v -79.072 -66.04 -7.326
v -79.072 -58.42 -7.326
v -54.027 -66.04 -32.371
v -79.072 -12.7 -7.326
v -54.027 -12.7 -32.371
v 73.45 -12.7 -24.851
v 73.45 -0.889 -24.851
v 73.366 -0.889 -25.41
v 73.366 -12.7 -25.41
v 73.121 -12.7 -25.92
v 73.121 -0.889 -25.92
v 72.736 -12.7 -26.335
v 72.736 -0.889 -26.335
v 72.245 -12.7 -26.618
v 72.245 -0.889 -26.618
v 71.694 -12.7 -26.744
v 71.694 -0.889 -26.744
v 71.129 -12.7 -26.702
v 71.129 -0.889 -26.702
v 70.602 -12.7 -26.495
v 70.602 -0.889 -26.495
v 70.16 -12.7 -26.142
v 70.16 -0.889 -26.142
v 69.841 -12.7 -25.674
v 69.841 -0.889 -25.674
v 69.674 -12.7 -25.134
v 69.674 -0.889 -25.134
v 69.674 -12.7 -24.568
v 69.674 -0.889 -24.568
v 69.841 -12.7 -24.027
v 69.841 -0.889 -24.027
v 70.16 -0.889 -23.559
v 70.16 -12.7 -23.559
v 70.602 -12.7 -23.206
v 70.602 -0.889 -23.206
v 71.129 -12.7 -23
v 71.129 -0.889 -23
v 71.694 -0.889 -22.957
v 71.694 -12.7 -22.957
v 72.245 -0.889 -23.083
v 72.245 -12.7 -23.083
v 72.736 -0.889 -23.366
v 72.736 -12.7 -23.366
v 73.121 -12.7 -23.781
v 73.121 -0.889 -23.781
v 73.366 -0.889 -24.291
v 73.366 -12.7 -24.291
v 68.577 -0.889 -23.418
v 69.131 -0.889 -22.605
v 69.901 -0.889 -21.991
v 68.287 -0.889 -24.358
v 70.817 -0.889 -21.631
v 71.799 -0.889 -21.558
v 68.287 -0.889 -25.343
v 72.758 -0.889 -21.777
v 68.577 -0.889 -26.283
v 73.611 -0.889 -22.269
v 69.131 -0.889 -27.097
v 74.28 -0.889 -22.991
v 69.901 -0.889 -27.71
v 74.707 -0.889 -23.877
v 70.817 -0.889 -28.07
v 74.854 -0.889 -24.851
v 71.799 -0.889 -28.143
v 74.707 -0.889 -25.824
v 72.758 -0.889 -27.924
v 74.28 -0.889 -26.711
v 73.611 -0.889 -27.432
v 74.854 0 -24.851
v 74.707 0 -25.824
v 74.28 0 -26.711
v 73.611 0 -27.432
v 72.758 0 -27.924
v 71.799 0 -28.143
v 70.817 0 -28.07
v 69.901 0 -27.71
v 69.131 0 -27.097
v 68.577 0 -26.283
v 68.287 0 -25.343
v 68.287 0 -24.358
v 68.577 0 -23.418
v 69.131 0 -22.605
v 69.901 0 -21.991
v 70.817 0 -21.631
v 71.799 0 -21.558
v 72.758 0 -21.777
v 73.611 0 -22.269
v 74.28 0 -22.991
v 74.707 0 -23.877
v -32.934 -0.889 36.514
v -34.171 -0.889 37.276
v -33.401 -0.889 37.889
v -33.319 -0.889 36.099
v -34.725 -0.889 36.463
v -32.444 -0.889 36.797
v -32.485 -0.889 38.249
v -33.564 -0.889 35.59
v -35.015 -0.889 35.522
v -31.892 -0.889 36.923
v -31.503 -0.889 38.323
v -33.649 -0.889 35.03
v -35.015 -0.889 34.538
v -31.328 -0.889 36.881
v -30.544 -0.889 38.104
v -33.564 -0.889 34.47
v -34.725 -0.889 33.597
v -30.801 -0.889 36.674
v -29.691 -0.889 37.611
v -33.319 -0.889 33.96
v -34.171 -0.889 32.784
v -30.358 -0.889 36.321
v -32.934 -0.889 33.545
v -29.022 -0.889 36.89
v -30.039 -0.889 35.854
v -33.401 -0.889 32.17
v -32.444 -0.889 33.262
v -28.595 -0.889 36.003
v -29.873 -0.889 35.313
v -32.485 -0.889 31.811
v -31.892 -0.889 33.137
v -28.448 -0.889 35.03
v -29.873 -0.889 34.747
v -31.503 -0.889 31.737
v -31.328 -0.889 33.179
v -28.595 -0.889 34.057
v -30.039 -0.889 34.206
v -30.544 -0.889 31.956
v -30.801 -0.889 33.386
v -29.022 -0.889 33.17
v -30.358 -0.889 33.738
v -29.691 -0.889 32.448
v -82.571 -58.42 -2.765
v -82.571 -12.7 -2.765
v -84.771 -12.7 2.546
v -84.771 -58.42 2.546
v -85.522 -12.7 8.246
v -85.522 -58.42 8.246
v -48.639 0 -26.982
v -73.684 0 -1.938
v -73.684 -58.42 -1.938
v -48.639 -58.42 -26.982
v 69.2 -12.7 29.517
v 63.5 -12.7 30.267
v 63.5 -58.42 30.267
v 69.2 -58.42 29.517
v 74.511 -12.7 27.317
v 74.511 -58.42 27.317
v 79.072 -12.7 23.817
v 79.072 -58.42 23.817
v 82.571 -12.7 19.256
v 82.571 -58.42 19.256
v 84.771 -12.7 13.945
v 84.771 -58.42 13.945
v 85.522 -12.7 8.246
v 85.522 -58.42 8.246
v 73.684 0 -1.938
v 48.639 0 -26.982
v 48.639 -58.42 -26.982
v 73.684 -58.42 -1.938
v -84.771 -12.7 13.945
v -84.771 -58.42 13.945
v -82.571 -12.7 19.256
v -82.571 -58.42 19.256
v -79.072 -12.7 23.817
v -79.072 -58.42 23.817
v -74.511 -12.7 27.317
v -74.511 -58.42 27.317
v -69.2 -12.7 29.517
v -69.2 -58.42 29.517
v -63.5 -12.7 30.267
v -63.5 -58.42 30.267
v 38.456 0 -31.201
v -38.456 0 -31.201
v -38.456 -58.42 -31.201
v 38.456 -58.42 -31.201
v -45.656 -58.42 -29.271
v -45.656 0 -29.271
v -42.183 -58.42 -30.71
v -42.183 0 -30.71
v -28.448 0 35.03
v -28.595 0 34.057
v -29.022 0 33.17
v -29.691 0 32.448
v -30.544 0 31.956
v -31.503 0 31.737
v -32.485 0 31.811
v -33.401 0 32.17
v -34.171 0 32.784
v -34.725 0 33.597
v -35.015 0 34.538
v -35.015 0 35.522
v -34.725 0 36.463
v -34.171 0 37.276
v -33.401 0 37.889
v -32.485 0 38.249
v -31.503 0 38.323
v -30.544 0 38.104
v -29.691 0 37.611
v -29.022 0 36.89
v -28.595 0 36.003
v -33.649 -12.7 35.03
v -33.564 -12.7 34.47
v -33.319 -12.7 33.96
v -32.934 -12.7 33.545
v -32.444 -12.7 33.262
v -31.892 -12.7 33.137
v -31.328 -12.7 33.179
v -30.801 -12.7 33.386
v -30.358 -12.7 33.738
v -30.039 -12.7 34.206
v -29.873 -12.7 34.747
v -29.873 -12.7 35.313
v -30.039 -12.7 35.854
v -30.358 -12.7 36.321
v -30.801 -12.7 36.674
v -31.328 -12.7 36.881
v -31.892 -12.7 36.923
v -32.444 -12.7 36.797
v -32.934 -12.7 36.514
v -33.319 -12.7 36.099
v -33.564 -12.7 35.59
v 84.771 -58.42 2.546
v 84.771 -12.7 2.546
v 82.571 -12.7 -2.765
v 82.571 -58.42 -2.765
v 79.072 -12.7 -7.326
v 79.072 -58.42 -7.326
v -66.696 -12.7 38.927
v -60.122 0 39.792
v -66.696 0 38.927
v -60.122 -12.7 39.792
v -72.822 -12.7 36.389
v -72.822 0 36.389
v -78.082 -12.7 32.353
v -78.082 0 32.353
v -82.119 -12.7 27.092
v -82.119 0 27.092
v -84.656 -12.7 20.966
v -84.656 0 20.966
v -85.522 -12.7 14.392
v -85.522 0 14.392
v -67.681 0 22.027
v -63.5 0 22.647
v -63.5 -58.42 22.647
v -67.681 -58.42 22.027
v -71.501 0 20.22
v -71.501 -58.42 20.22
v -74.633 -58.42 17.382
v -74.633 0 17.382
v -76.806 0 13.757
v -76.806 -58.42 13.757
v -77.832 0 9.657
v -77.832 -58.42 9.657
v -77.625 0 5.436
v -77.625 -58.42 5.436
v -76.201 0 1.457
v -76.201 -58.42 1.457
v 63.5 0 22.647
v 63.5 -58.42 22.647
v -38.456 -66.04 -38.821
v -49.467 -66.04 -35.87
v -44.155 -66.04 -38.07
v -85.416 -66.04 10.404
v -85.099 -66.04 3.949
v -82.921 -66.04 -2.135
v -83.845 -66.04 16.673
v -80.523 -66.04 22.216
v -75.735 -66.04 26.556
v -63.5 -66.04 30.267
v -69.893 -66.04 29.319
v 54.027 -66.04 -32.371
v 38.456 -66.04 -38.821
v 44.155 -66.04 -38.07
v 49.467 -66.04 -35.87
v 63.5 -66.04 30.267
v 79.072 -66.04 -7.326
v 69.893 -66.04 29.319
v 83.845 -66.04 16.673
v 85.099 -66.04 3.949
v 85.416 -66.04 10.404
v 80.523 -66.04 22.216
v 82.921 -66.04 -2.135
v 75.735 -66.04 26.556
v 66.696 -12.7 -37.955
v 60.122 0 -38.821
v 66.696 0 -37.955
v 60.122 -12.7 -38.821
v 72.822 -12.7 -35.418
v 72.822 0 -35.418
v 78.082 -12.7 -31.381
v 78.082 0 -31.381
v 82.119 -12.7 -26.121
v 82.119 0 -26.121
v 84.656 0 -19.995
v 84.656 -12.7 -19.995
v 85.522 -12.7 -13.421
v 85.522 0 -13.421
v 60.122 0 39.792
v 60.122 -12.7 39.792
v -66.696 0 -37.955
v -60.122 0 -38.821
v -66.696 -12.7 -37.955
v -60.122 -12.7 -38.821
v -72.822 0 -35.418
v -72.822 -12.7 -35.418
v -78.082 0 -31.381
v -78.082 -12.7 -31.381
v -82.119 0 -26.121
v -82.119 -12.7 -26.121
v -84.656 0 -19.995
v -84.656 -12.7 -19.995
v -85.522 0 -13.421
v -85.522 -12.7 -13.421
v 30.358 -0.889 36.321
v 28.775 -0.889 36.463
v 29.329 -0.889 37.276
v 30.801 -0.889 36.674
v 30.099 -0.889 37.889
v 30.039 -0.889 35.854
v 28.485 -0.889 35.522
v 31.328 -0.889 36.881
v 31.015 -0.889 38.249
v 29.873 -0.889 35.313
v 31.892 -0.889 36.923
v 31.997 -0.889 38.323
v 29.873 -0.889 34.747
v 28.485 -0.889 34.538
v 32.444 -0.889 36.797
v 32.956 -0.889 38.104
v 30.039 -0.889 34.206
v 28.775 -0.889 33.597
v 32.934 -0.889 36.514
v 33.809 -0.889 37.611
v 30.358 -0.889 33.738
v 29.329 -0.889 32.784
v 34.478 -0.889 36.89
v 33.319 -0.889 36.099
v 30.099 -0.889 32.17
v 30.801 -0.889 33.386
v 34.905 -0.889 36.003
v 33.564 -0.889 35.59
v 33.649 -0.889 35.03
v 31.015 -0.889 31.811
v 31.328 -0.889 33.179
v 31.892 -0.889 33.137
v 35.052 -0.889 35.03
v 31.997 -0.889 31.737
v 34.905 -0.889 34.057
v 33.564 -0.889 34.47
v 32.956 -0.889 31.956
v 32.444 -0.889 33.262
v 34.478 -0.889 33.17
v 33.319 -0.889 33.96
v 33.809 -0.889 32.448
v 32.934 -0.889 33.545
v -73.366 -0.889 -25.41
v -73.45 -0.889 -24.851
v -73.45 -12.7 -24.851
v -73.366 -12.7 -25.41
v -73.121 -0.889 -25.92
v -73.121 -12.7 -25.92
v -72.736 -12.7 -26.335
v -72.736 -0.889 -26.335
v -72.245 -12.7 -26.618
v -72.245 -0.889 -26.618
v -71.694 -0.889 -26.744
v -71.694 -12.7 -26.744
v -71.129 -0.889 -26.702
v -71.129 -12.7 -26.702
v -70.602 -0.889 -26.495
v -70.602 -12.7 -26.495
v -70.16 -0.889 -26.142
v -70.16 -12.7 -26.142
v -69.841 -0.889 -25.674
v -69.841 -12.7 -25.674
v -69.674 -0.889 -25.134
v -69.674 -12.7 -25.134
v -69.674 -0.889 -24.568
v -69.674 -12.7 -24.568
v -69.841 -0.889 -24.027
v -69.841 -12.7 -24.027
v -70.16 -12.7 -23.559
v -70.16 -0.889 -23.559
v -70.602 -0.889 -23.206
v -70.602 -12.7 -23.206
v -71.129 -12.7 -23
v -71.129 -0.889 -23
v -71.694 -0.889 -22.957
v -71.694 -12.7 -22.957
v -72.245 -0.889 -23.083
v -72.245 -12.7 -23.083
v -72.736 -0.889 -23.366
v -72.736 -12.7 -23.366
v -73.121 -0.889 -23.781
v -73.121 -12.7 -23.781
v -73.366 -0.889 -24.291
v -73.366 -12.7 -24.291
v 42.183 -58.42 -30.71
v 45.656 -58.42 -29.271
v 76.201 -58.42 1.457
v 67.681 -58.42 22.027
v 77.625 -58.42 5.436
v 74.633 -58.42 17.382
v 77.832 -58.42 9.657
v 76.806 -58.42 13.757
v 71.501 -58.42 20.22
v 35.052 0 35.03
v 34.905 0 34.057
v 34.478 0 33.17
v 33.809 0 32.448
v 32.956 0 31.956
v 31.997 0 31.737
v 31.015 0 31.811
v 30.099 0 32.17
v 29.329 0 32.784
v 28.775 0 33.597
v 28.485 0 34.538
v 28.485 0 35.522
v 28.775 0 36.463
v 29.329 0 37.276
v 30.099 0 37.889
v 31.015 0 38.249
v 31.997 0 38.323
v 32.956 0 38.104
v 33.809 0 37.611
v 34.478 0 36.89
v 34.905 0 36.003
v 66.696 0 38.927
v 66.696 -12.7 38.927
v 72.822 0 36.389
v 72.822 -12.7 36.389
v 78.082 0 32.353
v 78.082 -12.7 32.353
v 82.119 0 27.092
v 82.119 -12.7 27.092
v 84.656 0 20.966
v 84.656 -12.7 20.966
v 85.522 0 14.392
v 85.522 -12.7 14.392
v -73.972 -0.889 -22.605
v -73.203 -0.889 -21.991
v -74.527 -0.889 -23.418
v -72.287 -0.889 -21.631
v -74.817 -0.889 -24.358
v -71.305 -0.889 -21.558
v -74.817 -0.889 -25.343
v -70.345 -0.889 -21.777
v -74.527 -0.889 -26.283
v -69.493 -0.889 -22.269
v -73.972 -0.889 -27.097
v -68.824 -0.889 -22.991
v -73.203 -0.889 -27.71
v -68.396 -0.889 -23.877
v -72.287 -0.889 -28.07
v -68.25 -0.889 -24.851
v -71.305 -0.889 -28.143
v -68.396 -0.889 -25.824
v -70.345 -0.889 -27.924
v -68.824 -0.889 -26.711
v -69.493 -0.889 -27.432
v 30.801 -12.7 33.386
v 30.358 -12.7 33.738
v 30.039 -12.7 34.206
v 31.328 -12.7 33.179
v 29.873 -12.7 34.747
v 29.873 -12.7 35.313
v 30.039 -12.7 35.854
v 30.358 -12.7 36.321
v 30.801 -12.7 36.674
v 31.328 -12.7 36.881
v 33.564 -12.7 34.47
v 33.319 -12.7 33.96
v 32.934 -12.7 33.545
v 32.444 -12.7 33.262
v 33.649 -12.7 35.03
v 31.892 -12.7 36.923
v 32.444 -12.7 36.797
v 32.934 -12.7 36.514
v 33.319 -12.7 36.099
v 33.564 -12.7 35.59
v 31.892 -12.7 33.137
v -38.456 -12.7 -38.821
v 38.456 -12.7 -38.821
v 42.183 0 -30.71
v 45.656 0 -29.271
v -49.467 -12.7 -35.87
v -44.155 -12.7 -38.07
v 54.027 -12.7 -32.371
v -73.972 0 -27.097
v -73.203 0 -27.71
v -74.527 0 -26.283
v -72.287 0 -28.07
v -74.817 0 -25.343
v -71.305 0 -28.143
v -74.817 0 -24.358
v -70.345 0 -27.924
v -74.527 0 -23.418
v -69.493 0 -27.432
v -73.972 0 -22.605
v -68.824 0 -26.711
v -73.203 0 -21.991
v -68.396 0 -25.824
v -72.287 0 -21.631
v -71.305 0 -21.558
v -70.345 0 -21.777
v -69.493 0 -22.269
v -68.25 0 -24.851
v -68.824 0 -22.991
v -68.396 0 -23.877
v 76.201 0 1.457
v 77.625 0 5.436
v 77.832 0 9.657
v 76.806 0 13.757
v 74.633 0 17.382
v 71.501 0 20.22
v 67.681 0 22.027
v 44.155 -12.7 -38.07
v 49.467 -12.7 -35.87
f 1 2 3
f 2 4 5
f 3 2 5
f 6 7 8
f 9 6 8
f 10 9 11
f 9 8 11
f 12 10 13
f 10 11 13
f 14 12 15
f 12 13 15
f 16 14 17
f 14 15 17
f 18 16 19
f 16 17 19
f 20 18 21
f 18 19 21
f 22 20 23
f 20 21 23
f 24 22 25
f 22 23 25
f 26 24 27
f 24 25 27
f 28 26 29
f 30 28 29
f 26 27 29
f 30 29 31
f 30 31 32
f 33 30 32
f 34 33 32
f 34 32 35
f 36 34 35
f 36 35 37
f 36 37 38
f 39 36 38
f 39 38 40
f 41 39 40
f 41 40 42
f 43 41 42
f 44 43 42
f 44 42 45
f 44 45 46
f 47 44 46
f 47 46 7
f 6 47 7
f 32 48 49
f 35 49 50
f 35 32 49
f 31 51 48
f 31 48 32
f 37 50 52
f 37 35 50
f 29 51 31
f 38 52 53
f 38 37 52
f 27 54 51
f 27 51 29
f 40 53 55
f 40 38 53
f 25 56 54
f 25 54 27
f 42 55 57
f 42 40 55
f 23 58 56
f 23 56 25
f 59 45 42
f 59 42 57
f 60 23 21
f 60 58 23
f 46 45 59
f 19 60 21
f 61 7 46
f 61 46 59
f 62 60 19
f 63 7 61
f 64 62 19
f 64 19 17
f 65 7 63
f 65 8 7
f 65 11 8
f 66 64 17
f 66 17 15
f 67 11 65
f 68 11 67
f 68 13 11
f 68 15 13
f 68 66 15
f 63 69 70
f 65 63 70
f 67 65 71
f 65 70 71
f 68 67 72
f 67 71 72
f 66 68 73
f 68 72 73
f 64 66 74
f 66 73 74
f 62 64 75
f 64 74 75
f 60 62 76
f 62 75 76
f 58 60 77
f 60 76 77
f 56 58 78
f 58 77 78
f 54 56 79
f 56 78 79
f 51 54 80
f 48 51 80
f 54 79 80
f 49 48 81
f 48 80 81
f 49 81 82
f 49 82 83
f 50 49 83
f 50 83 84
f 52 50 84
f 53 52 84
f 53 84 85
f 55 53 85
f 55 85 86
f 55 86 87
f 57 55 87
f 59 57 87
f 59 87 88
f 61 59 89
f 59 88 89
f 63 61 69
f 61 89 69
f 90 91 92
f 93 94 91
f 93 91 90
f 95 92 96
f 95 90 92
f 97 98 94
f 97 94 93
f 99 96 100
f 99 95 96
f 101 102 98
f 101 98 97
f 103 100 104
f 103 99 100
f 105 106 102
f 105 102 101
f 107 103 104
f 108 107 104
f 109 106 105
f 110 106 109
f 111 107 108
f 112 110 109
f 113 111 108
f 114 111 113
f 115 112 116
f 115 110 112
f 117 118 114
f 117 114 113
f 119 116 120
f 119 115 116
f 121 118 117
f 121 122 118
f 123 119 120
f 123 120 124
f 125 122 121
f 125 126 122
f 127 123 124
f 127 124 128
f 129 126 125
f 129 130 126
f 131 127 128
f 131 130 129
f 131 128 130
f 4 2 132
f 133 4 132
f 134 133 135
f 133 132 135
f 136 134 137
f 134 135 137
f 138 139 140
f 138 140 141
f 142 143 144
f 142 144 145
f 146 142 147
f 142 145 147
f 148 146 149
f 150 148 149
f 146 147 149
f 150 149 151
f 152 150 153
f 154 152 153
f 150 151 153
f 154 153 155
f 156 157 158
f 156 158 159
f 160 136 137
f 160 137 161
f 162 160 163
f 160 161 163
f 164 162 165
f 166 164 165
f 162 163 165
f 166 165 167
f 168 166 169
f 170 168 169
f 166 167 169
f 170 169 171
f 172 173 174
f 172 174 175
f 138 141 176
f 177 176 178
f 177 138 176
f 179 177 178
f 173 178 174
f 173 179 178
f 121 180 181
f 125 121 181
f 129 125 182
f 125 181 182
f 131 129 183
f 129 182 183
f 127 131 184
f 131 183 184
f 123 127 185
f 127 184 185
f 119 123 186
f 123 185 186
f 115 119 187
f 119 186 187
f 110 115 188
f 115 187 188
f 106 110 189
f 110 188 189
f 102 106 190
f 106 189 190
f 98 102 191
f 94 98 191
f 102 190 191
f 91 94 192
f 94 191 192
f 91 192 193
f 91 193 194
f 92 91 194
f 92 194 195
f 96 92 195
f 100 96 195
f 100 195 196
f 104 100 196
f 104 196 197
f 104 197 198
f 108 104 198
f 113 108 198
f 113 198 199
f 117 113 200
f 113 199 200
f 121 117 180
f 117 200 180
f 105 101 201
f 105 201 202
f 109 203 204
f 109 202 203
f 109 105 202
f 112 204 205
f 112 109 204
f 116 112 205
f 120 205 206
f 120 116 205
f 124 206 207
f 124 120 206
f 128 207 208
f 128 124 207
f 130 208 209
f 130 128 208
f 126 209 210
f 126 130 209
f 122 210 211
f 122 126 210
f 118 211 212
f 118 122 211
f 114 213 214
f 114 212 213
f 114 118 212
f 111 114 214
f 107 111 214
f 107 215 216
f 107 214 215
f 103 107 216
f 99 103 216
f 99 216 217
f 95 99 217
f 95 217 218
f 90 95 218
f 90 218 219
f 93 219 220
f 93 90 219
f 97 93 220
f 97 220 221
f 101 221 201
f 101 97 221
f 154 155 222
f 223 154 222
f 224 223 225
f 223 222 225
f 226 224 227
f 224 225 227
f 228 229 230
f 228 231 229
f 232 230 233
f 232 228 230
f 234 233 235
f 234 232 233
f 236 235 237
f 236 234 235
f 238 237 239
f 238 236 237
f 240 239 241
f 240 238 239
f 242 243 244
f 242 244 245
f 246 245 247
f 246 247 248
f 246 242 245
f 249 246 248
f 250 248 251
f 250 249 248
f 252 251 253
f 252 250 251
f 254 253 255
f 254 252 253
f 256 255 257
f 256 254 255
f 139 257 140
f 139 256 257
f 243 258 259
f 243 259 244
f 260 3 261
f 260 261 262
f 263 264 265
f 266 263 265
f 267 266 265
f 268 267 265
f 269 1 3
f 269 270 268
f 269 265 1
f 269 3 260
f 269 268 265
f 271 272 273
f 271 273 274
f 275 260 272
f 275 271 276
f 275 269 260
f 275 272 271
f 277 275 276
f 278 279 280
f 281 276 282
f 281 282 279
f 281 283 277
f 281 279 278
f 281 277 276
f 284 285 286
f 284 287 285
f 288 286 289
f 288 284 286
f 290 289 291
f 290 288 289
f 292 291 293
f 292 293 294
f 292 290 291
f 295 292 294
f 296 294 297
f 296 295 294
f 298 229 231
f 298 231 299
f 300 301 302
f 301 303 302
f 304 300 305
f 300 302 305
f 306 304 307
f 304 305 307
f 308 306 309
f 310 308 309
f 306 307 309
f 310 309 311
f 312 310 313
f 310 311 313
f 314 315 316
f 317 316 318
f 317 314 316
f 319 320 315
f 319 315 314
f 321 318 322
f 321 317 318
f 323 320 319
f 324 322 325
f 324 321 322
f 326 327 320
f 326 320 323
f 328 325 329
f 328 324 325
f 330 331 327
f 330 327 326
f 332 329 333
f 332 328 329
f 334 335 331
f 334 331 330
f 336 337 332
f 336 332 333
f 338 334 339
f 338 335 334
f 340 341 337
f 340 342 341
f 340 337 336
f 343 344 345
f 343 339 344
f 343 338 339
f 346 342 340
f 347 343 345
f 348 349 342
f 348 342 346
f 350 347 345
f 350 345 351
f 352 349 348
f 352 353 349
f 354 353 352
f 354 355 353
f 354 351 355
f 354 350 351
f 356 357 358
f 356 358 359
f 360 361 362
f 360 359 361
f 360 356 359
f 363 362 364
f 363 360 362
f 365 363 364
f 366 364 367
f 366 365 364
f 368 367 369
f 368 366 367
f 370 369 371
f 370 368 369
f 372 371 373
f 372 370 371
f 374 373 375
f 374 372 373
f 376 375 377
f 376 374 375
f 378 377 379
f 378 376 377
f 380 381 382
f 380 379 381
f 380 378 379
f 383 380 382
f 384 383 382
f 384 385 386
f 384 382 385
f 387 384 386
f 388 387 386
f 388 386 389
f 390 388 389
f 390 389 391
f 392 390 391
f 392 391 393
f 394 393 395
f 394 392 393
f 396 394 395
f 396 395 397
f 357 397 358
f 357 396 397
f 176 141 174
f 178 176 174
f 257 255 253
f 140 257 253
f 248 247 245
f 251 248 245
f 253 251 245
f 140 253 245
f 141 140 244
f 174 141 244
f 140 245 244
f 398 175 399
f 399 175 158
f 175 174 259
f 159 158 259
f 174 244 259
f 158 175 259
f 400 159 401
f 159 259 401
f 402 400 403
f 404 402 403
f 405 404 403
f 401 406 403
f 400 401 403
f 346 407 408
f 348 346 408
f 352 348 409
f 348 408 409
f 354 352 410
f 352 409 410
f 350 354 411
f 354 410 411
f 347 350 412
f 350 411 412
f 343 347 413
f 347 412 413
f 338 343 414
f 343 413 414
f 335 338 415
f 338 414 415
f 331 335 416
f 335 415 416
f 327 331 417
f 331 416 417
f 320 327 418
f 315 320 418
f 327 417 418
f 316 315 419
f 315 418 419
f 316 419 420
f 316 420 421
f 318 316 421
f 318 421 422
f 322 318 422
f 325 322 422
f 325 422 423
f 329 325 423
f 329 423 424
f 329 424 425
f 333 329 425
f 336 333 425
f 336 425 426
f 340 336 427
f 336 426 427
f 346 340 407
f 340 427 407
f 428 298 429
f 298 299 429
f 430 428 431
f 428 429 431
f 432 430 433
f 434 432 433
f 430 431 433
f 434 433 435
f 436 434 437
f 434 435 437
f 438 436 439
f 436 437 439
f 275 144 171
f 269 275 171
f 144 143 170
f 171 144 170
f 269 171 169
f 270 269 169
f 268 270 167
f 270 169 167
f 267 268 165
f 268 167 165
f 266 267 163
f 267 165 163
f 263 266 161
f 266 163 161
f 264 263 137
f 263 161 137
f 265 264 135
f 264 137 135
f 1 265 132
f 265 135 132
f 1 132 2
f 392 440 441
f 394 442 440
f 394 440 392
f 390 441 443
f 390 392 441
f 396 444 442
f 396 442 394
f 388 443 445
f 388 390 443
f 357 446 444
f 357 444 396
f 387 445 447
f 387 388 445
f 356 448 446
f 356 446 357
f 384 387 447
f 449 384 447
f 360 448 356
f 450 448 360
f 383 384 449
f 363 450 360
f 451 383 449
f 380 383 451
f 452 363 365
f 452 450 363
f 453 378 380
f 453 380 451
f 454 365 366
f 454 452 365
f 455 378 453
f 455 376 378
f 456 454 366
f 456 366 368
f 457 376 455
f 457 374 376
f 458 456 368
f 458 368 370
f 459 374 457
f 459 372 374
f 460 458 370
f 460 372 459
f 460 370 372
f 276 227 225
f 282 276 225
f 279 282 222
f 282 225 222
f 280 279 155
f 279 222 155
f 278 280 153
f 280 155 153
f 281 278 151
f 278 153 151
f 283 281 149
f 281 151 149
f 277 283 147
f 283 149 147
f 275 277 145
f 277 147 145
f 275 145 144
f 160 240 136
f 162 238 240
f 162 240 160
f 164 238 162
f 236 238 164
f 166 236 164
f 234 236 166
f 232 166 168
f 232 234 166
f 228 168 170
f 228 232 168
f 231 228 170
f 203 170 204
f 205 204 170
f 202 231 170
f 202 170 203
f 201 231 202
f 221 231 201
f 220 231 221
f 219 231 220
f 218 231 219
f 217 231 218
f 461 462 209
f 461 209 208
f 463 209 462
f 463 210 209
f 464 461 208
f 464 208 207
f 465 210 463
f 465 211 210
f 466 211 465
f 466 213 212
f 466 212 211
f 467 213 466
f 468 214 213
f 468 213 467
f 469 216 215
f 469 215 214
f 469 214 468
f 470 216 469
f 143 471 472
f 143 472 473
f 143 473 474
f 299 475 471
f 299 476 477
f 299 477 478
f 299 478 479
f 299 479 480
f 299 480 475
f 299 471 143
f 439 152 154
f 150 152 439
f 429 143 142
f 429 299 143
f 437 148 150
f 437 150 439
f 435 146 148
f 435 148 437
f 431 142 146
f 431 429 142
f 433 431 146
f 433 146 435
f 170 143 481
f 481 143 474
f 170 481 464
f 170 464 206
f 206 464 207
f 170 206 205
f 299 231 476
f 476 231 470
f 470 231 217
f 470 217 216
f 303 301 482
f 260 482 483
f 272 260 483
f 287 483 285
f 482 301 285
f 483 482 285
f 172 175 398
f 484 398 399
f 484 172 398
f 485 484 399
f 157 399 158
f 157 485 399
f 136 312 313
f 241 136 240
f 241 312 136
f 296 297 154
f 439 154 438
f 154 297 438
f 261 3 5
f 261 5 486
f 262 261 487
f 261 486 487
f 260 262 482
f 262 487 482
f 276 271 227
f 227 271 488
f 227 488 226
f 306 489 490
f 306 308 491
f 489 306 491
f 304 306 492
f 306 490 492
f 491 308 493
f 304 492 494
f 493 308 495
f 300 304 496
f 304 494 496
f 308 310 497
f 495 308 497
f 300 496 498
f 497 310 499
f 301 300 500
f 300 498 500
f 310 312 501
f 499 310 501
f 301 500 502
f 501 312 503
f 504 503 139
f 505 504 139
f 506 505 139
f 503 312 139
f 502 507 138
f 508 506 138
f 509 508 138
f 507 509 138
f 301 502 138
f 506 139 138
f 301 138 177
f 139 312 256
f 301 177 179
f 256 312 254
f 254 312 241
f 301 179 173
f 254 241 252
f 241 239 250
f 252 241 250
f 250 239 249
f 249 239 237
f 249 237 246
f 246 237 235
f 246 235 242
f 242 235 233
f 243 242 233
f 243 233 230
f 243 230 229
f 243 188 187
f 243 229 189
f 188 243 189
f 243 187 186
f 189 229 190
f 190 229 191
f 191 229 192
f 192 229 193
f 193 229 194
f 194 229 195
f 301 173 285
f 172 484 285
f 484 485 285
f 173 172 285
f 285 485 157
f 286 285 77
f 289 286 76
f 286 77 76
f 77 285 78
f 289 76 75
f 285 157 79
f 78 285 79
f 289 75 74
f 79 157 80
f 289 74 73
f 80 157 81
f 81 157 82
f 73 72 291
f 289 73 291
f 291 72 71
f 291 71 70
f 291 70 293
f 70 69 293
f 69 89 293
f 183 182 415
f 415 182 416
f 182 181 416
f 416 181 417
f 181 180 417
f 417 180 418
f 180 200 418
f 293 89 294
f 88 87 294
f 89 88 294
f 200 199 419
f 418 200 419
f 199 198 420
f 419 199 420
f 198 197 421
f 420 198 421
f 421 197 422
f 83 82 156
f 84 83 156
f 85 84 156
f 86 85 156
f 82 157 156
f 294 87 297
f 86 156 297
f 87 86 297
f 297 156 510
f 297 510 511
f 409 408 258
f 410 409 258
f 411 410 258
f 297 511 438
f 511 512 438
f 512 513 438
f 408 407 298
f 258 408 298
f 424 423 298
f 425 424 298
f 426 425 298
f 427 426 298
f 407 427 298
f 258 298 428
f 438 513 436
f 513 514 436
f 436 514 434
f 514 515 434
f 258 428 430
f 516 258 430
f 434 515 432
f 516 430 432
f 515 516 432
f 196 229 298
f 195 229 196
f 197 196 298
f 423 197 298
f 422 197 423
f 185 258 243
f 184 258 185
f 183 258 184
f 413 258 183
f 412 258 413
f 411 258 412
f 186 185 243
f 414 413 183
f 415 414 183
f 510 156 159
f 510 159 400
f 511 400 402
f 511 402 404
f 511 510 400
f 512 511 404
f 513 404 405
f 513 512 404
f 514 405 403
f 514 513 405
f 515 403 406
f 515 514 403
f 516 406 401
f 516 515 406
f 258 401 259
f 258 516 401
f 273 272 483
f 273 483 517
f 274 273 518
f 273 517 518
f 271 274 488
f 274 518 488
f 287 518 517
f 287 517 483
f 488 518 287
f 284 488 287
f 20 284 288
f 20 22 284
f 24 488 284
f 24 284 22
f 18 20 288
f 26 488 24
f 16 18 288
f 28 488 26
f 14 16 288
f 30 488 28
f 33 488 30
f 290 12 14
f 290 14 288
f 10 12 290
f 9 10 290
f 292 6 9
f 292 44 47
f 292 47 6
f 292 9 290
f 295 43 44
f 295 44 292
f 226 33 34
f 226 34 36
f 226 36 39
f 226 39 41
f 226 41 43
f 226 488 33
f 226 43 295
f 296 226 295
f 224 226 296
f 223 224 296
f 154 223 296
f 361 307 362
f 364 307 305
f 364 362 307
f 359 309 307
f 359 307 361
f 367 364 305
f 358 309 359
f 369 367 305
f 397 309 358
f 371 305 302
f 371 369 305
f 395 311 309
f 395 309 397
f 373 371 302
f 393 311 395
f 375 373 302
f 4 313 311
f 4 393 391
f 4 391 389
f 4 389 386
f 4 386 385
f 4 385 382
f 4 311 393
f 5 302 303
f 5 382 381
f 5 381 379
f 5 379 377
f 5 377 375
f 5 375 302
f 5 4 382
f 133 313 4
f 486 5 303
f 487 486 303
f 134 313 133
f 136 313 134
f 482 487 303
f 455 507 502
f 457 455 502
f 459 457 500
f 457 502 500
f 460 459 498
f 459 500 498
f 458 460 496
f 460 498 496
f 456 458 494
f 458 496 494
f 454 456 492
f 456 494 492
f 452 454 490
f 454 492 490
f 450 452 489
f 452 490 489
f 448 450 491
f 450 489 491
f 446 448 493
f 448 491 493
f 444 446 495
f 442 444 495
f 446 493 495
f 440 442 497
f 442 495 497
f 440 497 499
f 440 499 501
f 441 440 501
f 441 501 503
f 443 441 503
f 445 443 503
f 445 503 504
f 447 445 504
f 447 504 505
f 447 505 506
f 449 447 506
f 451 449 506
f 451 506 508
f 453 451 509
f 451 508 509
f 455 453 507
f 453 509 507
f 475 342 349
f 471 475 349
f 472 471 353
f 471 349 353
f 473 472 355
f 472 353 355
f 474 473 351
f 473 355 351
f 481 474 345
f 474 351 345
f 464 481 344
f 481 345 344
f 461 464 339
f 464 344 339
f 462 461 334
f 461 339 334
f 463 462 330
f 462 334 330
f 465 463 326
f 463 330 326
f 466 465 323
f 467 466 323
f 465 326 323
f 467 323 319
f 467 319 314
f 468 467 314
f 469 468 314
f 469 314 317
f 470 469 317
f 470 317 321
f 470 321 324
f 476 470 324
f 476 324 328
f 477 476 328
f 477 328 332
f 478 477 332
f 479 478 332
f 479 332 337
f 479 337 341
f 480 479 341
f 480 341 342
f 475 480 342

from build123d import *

# Parameters (mm, degrees)
SKETCH1_W             = 171.0436
SKETCH1_H             = 78.613
BOSS_EXTRUDE1_DEPTH   = 58.42
CUT_EXTRUDE1_DEPTH    = 45.72
BOSS_EXTRUDE2_DEPTH   = 7.62
FILLET1_R             = 25.4
F_6_CLEARANCE_HOLE2_D = 3.7973
SKETCH12_R            = 3.302
CUT_EXTRUDE2_DEPTH    = 0.889


with BuildPart() as part:
    # Sketch1 → Boss-Extrude1 (new body)
    with BuildSketch(Plane.XZ):
        with Locations((0, 0.485871825)):
            Rectangle(SKETCH1_W, SKETCH1_H)
        with BuildLine():
            Line((-73.683610441, -1.938038616), (-48.639210441, -26.982438616))
            ThreePointArc((-48.639210441, -26.982438616), (-43.966930256, -30.104356426), (-38.4556, -31.200628175))
            Line((-38.4556, -31.200628175), (38.4556, -31.200628175))
            ThreePointArc((38.4556, -31.200628175), (43.966930256, -30.104356426), (48.639210441, -26.982438616))
            Line((48.639210441, -26.982438616), (73.683610441, -1.938038616))
            ThreePointArc((73.683610441, -1.938038616), (76.805528251, 13.756902081), (63.5, 22.647371825))
            Line((63.5, 22.647371825), (-63.5, 22.647371825))
            ThreePointArc((-63.5, 22.647371825), (-76.805528251, 13.756902081), (-73.683610441, -1.938038616))
        make_face(mode=Mode.SUBTRACT)
    extrude(amount=BOSS_EXTRUDE1_DEPTH)

    # Sketch2 → Cut-Extrude1 (cut)
    with BuildSketch(Plane.XZ.offset(58.42)):
        with BuildLine():
            ThreePointArc((54.027364114, -32.370592289), (46.882978011, -37.144318464), (38.4556, -38.820628175))
            Line((38.4556, -38.820628175), (85.5218, -38.820628175))
            Line((85.5218, -38.820628175), (85.5218, 8.245571825))
            ThreePointArc((85.5218, 8.245571825), (83.845490289, -0.181806186), (79.071764114, -7.326192289))
            Line((79.071764114, -7.326192289), (54.027364114, -32.370592289))
        make_face()
        with BuildLine():
            Line((-85.5218, 8.245571825), (-85.5218, -38.820628175))
            Line((-85.5218, -38.820628175), (-38.4556, -38.820628175))
            ThreePointArc((-38.4556, -38.820628175), (-46.882978011, -37.144318464), (-54.027364114, -32.370592289))
            Line((-54.027364114, -32.370592289), (-79.071764114, -7.326192289))
            ThreePointArc((-79.071764114, -7.326192289), (-83.845490289, -0.181806186), (-85.5218, 8.245571825))
        make_face()
        with BuildLine():
            Line((-85.5218, 39.792371825), (-85.5218, 8.245571825))
            ThreePointArc((-85.5218, 8.245571825), (-79.071764114, 23.817335939), (-63.5, 30.267371825))
            Line((-63.5, 30.267371825), (63.5, 30.267371825))
            ThreePointArc((63.5, 30.267371825), (79.071764114, 23.817335939), (85.5218, 8.245571825))
            Line((85.5218, 8.245571825), (85.5218, 39.792371825))
            Line((85.5218, 39.792371825), (-85.5218, 39.792371825))
        make_face()
    extrude(amount=-CUT_EXTRUDE1_DEPTH, mode=Mode.SUBTRACT)

    # Sketch3 → Boss-Extrude2 (add)
    with BuildSketch(Plane.XZ.offset(58.42)):
        with BuildLine():
            Line((-79.071764114, -7.326192289), (-54.027364114, -32.370592289))
            ThreePointArc((-54.027364114, -32.370592289), (-46.882978011, -37.144318464), (-38.4556, -38.820628175))
            Line((-38.4556, -38.820628175), (38.4556, -38.820628175))
            ThreePointArc((38.4556, -38.820628175), (46.882978011, -37.144318464), (54.027364114, -32.370592289))
            Line((54.027364114, -32.370592289), (79.071764114, -7.326192289))
            ThreePointArc((79.071764114, -7.326192289), (83.845490289, 16.672949836), (63.5, 30.267371825))
            Line((63.5, 30.267371825), (-63.5, 30.267371825))
            ThreePointArc((-63.5, 30.267371825), (-83.845490289, 16.672949836), (-79.071764114, -7.326192289))
        make_face()
    extrude(amount=BOSS_EXTRUDE2_DEPTH)

    # Fillet1
    fillet1_edges = [part.edges().sort_by_distance(p)[0] for p in [
        (85.5218, -6.35, -38.820628175),
        (-85.5218, -6.35, -38.820628175),
        (-85.5218, -6.35, 39.792371825),
        (85.5218, -6.35, 39.792371825),
    ]]
    fillet(fillet1_edges, radius=FILLET1_R)

    # #6 Clearance Hole2 (through all)
    with Locations(Plane(origin=(0, -12.7, 0), x_dir=(-1, 0, 0), z_dir=(0, -1, 0))):
        with Locations((-31.75, -35.029871825), (-71.5518, 24.850628175)):
            f_6_clearance_hole2 = Hole(F_6_CLEARANCE_HOLE2_D / 2)

    # Mirror1: #6 Clearance Hole2 across plane
    add(f_6_clearance_hole2.mirror(Plane(origin=(0, 0, 0), x_dir=(0, 0, 1), z_dir=(1, 0, 0))), mode=Mode.SUBTRACT)

    # Sketch12 → Cut-Extrude2 (cut)
    with BuildSketch(Plane(origin=(0, 0, 0), x_dir=(1, 0, 0), z_dir=(0, 1, 0))):
        with Locations((-71.5518, 24.850628175)):
            Circle(SKETCH12_R)
        with Locations((-31.75, -35.029871825)):
            Circle(SKETCH12_R)
        with Locations((31.75, -35.029871825)):
            Circle(SKETCH12_R)
        with Locations((71.5518, 24.850628175)):
            Circle(SKETCH12_R)
    extrude(amount=-CUT_EXTRUDE2_DEPTH, mode=Mode.SUBTRACT)


solid = part.part
